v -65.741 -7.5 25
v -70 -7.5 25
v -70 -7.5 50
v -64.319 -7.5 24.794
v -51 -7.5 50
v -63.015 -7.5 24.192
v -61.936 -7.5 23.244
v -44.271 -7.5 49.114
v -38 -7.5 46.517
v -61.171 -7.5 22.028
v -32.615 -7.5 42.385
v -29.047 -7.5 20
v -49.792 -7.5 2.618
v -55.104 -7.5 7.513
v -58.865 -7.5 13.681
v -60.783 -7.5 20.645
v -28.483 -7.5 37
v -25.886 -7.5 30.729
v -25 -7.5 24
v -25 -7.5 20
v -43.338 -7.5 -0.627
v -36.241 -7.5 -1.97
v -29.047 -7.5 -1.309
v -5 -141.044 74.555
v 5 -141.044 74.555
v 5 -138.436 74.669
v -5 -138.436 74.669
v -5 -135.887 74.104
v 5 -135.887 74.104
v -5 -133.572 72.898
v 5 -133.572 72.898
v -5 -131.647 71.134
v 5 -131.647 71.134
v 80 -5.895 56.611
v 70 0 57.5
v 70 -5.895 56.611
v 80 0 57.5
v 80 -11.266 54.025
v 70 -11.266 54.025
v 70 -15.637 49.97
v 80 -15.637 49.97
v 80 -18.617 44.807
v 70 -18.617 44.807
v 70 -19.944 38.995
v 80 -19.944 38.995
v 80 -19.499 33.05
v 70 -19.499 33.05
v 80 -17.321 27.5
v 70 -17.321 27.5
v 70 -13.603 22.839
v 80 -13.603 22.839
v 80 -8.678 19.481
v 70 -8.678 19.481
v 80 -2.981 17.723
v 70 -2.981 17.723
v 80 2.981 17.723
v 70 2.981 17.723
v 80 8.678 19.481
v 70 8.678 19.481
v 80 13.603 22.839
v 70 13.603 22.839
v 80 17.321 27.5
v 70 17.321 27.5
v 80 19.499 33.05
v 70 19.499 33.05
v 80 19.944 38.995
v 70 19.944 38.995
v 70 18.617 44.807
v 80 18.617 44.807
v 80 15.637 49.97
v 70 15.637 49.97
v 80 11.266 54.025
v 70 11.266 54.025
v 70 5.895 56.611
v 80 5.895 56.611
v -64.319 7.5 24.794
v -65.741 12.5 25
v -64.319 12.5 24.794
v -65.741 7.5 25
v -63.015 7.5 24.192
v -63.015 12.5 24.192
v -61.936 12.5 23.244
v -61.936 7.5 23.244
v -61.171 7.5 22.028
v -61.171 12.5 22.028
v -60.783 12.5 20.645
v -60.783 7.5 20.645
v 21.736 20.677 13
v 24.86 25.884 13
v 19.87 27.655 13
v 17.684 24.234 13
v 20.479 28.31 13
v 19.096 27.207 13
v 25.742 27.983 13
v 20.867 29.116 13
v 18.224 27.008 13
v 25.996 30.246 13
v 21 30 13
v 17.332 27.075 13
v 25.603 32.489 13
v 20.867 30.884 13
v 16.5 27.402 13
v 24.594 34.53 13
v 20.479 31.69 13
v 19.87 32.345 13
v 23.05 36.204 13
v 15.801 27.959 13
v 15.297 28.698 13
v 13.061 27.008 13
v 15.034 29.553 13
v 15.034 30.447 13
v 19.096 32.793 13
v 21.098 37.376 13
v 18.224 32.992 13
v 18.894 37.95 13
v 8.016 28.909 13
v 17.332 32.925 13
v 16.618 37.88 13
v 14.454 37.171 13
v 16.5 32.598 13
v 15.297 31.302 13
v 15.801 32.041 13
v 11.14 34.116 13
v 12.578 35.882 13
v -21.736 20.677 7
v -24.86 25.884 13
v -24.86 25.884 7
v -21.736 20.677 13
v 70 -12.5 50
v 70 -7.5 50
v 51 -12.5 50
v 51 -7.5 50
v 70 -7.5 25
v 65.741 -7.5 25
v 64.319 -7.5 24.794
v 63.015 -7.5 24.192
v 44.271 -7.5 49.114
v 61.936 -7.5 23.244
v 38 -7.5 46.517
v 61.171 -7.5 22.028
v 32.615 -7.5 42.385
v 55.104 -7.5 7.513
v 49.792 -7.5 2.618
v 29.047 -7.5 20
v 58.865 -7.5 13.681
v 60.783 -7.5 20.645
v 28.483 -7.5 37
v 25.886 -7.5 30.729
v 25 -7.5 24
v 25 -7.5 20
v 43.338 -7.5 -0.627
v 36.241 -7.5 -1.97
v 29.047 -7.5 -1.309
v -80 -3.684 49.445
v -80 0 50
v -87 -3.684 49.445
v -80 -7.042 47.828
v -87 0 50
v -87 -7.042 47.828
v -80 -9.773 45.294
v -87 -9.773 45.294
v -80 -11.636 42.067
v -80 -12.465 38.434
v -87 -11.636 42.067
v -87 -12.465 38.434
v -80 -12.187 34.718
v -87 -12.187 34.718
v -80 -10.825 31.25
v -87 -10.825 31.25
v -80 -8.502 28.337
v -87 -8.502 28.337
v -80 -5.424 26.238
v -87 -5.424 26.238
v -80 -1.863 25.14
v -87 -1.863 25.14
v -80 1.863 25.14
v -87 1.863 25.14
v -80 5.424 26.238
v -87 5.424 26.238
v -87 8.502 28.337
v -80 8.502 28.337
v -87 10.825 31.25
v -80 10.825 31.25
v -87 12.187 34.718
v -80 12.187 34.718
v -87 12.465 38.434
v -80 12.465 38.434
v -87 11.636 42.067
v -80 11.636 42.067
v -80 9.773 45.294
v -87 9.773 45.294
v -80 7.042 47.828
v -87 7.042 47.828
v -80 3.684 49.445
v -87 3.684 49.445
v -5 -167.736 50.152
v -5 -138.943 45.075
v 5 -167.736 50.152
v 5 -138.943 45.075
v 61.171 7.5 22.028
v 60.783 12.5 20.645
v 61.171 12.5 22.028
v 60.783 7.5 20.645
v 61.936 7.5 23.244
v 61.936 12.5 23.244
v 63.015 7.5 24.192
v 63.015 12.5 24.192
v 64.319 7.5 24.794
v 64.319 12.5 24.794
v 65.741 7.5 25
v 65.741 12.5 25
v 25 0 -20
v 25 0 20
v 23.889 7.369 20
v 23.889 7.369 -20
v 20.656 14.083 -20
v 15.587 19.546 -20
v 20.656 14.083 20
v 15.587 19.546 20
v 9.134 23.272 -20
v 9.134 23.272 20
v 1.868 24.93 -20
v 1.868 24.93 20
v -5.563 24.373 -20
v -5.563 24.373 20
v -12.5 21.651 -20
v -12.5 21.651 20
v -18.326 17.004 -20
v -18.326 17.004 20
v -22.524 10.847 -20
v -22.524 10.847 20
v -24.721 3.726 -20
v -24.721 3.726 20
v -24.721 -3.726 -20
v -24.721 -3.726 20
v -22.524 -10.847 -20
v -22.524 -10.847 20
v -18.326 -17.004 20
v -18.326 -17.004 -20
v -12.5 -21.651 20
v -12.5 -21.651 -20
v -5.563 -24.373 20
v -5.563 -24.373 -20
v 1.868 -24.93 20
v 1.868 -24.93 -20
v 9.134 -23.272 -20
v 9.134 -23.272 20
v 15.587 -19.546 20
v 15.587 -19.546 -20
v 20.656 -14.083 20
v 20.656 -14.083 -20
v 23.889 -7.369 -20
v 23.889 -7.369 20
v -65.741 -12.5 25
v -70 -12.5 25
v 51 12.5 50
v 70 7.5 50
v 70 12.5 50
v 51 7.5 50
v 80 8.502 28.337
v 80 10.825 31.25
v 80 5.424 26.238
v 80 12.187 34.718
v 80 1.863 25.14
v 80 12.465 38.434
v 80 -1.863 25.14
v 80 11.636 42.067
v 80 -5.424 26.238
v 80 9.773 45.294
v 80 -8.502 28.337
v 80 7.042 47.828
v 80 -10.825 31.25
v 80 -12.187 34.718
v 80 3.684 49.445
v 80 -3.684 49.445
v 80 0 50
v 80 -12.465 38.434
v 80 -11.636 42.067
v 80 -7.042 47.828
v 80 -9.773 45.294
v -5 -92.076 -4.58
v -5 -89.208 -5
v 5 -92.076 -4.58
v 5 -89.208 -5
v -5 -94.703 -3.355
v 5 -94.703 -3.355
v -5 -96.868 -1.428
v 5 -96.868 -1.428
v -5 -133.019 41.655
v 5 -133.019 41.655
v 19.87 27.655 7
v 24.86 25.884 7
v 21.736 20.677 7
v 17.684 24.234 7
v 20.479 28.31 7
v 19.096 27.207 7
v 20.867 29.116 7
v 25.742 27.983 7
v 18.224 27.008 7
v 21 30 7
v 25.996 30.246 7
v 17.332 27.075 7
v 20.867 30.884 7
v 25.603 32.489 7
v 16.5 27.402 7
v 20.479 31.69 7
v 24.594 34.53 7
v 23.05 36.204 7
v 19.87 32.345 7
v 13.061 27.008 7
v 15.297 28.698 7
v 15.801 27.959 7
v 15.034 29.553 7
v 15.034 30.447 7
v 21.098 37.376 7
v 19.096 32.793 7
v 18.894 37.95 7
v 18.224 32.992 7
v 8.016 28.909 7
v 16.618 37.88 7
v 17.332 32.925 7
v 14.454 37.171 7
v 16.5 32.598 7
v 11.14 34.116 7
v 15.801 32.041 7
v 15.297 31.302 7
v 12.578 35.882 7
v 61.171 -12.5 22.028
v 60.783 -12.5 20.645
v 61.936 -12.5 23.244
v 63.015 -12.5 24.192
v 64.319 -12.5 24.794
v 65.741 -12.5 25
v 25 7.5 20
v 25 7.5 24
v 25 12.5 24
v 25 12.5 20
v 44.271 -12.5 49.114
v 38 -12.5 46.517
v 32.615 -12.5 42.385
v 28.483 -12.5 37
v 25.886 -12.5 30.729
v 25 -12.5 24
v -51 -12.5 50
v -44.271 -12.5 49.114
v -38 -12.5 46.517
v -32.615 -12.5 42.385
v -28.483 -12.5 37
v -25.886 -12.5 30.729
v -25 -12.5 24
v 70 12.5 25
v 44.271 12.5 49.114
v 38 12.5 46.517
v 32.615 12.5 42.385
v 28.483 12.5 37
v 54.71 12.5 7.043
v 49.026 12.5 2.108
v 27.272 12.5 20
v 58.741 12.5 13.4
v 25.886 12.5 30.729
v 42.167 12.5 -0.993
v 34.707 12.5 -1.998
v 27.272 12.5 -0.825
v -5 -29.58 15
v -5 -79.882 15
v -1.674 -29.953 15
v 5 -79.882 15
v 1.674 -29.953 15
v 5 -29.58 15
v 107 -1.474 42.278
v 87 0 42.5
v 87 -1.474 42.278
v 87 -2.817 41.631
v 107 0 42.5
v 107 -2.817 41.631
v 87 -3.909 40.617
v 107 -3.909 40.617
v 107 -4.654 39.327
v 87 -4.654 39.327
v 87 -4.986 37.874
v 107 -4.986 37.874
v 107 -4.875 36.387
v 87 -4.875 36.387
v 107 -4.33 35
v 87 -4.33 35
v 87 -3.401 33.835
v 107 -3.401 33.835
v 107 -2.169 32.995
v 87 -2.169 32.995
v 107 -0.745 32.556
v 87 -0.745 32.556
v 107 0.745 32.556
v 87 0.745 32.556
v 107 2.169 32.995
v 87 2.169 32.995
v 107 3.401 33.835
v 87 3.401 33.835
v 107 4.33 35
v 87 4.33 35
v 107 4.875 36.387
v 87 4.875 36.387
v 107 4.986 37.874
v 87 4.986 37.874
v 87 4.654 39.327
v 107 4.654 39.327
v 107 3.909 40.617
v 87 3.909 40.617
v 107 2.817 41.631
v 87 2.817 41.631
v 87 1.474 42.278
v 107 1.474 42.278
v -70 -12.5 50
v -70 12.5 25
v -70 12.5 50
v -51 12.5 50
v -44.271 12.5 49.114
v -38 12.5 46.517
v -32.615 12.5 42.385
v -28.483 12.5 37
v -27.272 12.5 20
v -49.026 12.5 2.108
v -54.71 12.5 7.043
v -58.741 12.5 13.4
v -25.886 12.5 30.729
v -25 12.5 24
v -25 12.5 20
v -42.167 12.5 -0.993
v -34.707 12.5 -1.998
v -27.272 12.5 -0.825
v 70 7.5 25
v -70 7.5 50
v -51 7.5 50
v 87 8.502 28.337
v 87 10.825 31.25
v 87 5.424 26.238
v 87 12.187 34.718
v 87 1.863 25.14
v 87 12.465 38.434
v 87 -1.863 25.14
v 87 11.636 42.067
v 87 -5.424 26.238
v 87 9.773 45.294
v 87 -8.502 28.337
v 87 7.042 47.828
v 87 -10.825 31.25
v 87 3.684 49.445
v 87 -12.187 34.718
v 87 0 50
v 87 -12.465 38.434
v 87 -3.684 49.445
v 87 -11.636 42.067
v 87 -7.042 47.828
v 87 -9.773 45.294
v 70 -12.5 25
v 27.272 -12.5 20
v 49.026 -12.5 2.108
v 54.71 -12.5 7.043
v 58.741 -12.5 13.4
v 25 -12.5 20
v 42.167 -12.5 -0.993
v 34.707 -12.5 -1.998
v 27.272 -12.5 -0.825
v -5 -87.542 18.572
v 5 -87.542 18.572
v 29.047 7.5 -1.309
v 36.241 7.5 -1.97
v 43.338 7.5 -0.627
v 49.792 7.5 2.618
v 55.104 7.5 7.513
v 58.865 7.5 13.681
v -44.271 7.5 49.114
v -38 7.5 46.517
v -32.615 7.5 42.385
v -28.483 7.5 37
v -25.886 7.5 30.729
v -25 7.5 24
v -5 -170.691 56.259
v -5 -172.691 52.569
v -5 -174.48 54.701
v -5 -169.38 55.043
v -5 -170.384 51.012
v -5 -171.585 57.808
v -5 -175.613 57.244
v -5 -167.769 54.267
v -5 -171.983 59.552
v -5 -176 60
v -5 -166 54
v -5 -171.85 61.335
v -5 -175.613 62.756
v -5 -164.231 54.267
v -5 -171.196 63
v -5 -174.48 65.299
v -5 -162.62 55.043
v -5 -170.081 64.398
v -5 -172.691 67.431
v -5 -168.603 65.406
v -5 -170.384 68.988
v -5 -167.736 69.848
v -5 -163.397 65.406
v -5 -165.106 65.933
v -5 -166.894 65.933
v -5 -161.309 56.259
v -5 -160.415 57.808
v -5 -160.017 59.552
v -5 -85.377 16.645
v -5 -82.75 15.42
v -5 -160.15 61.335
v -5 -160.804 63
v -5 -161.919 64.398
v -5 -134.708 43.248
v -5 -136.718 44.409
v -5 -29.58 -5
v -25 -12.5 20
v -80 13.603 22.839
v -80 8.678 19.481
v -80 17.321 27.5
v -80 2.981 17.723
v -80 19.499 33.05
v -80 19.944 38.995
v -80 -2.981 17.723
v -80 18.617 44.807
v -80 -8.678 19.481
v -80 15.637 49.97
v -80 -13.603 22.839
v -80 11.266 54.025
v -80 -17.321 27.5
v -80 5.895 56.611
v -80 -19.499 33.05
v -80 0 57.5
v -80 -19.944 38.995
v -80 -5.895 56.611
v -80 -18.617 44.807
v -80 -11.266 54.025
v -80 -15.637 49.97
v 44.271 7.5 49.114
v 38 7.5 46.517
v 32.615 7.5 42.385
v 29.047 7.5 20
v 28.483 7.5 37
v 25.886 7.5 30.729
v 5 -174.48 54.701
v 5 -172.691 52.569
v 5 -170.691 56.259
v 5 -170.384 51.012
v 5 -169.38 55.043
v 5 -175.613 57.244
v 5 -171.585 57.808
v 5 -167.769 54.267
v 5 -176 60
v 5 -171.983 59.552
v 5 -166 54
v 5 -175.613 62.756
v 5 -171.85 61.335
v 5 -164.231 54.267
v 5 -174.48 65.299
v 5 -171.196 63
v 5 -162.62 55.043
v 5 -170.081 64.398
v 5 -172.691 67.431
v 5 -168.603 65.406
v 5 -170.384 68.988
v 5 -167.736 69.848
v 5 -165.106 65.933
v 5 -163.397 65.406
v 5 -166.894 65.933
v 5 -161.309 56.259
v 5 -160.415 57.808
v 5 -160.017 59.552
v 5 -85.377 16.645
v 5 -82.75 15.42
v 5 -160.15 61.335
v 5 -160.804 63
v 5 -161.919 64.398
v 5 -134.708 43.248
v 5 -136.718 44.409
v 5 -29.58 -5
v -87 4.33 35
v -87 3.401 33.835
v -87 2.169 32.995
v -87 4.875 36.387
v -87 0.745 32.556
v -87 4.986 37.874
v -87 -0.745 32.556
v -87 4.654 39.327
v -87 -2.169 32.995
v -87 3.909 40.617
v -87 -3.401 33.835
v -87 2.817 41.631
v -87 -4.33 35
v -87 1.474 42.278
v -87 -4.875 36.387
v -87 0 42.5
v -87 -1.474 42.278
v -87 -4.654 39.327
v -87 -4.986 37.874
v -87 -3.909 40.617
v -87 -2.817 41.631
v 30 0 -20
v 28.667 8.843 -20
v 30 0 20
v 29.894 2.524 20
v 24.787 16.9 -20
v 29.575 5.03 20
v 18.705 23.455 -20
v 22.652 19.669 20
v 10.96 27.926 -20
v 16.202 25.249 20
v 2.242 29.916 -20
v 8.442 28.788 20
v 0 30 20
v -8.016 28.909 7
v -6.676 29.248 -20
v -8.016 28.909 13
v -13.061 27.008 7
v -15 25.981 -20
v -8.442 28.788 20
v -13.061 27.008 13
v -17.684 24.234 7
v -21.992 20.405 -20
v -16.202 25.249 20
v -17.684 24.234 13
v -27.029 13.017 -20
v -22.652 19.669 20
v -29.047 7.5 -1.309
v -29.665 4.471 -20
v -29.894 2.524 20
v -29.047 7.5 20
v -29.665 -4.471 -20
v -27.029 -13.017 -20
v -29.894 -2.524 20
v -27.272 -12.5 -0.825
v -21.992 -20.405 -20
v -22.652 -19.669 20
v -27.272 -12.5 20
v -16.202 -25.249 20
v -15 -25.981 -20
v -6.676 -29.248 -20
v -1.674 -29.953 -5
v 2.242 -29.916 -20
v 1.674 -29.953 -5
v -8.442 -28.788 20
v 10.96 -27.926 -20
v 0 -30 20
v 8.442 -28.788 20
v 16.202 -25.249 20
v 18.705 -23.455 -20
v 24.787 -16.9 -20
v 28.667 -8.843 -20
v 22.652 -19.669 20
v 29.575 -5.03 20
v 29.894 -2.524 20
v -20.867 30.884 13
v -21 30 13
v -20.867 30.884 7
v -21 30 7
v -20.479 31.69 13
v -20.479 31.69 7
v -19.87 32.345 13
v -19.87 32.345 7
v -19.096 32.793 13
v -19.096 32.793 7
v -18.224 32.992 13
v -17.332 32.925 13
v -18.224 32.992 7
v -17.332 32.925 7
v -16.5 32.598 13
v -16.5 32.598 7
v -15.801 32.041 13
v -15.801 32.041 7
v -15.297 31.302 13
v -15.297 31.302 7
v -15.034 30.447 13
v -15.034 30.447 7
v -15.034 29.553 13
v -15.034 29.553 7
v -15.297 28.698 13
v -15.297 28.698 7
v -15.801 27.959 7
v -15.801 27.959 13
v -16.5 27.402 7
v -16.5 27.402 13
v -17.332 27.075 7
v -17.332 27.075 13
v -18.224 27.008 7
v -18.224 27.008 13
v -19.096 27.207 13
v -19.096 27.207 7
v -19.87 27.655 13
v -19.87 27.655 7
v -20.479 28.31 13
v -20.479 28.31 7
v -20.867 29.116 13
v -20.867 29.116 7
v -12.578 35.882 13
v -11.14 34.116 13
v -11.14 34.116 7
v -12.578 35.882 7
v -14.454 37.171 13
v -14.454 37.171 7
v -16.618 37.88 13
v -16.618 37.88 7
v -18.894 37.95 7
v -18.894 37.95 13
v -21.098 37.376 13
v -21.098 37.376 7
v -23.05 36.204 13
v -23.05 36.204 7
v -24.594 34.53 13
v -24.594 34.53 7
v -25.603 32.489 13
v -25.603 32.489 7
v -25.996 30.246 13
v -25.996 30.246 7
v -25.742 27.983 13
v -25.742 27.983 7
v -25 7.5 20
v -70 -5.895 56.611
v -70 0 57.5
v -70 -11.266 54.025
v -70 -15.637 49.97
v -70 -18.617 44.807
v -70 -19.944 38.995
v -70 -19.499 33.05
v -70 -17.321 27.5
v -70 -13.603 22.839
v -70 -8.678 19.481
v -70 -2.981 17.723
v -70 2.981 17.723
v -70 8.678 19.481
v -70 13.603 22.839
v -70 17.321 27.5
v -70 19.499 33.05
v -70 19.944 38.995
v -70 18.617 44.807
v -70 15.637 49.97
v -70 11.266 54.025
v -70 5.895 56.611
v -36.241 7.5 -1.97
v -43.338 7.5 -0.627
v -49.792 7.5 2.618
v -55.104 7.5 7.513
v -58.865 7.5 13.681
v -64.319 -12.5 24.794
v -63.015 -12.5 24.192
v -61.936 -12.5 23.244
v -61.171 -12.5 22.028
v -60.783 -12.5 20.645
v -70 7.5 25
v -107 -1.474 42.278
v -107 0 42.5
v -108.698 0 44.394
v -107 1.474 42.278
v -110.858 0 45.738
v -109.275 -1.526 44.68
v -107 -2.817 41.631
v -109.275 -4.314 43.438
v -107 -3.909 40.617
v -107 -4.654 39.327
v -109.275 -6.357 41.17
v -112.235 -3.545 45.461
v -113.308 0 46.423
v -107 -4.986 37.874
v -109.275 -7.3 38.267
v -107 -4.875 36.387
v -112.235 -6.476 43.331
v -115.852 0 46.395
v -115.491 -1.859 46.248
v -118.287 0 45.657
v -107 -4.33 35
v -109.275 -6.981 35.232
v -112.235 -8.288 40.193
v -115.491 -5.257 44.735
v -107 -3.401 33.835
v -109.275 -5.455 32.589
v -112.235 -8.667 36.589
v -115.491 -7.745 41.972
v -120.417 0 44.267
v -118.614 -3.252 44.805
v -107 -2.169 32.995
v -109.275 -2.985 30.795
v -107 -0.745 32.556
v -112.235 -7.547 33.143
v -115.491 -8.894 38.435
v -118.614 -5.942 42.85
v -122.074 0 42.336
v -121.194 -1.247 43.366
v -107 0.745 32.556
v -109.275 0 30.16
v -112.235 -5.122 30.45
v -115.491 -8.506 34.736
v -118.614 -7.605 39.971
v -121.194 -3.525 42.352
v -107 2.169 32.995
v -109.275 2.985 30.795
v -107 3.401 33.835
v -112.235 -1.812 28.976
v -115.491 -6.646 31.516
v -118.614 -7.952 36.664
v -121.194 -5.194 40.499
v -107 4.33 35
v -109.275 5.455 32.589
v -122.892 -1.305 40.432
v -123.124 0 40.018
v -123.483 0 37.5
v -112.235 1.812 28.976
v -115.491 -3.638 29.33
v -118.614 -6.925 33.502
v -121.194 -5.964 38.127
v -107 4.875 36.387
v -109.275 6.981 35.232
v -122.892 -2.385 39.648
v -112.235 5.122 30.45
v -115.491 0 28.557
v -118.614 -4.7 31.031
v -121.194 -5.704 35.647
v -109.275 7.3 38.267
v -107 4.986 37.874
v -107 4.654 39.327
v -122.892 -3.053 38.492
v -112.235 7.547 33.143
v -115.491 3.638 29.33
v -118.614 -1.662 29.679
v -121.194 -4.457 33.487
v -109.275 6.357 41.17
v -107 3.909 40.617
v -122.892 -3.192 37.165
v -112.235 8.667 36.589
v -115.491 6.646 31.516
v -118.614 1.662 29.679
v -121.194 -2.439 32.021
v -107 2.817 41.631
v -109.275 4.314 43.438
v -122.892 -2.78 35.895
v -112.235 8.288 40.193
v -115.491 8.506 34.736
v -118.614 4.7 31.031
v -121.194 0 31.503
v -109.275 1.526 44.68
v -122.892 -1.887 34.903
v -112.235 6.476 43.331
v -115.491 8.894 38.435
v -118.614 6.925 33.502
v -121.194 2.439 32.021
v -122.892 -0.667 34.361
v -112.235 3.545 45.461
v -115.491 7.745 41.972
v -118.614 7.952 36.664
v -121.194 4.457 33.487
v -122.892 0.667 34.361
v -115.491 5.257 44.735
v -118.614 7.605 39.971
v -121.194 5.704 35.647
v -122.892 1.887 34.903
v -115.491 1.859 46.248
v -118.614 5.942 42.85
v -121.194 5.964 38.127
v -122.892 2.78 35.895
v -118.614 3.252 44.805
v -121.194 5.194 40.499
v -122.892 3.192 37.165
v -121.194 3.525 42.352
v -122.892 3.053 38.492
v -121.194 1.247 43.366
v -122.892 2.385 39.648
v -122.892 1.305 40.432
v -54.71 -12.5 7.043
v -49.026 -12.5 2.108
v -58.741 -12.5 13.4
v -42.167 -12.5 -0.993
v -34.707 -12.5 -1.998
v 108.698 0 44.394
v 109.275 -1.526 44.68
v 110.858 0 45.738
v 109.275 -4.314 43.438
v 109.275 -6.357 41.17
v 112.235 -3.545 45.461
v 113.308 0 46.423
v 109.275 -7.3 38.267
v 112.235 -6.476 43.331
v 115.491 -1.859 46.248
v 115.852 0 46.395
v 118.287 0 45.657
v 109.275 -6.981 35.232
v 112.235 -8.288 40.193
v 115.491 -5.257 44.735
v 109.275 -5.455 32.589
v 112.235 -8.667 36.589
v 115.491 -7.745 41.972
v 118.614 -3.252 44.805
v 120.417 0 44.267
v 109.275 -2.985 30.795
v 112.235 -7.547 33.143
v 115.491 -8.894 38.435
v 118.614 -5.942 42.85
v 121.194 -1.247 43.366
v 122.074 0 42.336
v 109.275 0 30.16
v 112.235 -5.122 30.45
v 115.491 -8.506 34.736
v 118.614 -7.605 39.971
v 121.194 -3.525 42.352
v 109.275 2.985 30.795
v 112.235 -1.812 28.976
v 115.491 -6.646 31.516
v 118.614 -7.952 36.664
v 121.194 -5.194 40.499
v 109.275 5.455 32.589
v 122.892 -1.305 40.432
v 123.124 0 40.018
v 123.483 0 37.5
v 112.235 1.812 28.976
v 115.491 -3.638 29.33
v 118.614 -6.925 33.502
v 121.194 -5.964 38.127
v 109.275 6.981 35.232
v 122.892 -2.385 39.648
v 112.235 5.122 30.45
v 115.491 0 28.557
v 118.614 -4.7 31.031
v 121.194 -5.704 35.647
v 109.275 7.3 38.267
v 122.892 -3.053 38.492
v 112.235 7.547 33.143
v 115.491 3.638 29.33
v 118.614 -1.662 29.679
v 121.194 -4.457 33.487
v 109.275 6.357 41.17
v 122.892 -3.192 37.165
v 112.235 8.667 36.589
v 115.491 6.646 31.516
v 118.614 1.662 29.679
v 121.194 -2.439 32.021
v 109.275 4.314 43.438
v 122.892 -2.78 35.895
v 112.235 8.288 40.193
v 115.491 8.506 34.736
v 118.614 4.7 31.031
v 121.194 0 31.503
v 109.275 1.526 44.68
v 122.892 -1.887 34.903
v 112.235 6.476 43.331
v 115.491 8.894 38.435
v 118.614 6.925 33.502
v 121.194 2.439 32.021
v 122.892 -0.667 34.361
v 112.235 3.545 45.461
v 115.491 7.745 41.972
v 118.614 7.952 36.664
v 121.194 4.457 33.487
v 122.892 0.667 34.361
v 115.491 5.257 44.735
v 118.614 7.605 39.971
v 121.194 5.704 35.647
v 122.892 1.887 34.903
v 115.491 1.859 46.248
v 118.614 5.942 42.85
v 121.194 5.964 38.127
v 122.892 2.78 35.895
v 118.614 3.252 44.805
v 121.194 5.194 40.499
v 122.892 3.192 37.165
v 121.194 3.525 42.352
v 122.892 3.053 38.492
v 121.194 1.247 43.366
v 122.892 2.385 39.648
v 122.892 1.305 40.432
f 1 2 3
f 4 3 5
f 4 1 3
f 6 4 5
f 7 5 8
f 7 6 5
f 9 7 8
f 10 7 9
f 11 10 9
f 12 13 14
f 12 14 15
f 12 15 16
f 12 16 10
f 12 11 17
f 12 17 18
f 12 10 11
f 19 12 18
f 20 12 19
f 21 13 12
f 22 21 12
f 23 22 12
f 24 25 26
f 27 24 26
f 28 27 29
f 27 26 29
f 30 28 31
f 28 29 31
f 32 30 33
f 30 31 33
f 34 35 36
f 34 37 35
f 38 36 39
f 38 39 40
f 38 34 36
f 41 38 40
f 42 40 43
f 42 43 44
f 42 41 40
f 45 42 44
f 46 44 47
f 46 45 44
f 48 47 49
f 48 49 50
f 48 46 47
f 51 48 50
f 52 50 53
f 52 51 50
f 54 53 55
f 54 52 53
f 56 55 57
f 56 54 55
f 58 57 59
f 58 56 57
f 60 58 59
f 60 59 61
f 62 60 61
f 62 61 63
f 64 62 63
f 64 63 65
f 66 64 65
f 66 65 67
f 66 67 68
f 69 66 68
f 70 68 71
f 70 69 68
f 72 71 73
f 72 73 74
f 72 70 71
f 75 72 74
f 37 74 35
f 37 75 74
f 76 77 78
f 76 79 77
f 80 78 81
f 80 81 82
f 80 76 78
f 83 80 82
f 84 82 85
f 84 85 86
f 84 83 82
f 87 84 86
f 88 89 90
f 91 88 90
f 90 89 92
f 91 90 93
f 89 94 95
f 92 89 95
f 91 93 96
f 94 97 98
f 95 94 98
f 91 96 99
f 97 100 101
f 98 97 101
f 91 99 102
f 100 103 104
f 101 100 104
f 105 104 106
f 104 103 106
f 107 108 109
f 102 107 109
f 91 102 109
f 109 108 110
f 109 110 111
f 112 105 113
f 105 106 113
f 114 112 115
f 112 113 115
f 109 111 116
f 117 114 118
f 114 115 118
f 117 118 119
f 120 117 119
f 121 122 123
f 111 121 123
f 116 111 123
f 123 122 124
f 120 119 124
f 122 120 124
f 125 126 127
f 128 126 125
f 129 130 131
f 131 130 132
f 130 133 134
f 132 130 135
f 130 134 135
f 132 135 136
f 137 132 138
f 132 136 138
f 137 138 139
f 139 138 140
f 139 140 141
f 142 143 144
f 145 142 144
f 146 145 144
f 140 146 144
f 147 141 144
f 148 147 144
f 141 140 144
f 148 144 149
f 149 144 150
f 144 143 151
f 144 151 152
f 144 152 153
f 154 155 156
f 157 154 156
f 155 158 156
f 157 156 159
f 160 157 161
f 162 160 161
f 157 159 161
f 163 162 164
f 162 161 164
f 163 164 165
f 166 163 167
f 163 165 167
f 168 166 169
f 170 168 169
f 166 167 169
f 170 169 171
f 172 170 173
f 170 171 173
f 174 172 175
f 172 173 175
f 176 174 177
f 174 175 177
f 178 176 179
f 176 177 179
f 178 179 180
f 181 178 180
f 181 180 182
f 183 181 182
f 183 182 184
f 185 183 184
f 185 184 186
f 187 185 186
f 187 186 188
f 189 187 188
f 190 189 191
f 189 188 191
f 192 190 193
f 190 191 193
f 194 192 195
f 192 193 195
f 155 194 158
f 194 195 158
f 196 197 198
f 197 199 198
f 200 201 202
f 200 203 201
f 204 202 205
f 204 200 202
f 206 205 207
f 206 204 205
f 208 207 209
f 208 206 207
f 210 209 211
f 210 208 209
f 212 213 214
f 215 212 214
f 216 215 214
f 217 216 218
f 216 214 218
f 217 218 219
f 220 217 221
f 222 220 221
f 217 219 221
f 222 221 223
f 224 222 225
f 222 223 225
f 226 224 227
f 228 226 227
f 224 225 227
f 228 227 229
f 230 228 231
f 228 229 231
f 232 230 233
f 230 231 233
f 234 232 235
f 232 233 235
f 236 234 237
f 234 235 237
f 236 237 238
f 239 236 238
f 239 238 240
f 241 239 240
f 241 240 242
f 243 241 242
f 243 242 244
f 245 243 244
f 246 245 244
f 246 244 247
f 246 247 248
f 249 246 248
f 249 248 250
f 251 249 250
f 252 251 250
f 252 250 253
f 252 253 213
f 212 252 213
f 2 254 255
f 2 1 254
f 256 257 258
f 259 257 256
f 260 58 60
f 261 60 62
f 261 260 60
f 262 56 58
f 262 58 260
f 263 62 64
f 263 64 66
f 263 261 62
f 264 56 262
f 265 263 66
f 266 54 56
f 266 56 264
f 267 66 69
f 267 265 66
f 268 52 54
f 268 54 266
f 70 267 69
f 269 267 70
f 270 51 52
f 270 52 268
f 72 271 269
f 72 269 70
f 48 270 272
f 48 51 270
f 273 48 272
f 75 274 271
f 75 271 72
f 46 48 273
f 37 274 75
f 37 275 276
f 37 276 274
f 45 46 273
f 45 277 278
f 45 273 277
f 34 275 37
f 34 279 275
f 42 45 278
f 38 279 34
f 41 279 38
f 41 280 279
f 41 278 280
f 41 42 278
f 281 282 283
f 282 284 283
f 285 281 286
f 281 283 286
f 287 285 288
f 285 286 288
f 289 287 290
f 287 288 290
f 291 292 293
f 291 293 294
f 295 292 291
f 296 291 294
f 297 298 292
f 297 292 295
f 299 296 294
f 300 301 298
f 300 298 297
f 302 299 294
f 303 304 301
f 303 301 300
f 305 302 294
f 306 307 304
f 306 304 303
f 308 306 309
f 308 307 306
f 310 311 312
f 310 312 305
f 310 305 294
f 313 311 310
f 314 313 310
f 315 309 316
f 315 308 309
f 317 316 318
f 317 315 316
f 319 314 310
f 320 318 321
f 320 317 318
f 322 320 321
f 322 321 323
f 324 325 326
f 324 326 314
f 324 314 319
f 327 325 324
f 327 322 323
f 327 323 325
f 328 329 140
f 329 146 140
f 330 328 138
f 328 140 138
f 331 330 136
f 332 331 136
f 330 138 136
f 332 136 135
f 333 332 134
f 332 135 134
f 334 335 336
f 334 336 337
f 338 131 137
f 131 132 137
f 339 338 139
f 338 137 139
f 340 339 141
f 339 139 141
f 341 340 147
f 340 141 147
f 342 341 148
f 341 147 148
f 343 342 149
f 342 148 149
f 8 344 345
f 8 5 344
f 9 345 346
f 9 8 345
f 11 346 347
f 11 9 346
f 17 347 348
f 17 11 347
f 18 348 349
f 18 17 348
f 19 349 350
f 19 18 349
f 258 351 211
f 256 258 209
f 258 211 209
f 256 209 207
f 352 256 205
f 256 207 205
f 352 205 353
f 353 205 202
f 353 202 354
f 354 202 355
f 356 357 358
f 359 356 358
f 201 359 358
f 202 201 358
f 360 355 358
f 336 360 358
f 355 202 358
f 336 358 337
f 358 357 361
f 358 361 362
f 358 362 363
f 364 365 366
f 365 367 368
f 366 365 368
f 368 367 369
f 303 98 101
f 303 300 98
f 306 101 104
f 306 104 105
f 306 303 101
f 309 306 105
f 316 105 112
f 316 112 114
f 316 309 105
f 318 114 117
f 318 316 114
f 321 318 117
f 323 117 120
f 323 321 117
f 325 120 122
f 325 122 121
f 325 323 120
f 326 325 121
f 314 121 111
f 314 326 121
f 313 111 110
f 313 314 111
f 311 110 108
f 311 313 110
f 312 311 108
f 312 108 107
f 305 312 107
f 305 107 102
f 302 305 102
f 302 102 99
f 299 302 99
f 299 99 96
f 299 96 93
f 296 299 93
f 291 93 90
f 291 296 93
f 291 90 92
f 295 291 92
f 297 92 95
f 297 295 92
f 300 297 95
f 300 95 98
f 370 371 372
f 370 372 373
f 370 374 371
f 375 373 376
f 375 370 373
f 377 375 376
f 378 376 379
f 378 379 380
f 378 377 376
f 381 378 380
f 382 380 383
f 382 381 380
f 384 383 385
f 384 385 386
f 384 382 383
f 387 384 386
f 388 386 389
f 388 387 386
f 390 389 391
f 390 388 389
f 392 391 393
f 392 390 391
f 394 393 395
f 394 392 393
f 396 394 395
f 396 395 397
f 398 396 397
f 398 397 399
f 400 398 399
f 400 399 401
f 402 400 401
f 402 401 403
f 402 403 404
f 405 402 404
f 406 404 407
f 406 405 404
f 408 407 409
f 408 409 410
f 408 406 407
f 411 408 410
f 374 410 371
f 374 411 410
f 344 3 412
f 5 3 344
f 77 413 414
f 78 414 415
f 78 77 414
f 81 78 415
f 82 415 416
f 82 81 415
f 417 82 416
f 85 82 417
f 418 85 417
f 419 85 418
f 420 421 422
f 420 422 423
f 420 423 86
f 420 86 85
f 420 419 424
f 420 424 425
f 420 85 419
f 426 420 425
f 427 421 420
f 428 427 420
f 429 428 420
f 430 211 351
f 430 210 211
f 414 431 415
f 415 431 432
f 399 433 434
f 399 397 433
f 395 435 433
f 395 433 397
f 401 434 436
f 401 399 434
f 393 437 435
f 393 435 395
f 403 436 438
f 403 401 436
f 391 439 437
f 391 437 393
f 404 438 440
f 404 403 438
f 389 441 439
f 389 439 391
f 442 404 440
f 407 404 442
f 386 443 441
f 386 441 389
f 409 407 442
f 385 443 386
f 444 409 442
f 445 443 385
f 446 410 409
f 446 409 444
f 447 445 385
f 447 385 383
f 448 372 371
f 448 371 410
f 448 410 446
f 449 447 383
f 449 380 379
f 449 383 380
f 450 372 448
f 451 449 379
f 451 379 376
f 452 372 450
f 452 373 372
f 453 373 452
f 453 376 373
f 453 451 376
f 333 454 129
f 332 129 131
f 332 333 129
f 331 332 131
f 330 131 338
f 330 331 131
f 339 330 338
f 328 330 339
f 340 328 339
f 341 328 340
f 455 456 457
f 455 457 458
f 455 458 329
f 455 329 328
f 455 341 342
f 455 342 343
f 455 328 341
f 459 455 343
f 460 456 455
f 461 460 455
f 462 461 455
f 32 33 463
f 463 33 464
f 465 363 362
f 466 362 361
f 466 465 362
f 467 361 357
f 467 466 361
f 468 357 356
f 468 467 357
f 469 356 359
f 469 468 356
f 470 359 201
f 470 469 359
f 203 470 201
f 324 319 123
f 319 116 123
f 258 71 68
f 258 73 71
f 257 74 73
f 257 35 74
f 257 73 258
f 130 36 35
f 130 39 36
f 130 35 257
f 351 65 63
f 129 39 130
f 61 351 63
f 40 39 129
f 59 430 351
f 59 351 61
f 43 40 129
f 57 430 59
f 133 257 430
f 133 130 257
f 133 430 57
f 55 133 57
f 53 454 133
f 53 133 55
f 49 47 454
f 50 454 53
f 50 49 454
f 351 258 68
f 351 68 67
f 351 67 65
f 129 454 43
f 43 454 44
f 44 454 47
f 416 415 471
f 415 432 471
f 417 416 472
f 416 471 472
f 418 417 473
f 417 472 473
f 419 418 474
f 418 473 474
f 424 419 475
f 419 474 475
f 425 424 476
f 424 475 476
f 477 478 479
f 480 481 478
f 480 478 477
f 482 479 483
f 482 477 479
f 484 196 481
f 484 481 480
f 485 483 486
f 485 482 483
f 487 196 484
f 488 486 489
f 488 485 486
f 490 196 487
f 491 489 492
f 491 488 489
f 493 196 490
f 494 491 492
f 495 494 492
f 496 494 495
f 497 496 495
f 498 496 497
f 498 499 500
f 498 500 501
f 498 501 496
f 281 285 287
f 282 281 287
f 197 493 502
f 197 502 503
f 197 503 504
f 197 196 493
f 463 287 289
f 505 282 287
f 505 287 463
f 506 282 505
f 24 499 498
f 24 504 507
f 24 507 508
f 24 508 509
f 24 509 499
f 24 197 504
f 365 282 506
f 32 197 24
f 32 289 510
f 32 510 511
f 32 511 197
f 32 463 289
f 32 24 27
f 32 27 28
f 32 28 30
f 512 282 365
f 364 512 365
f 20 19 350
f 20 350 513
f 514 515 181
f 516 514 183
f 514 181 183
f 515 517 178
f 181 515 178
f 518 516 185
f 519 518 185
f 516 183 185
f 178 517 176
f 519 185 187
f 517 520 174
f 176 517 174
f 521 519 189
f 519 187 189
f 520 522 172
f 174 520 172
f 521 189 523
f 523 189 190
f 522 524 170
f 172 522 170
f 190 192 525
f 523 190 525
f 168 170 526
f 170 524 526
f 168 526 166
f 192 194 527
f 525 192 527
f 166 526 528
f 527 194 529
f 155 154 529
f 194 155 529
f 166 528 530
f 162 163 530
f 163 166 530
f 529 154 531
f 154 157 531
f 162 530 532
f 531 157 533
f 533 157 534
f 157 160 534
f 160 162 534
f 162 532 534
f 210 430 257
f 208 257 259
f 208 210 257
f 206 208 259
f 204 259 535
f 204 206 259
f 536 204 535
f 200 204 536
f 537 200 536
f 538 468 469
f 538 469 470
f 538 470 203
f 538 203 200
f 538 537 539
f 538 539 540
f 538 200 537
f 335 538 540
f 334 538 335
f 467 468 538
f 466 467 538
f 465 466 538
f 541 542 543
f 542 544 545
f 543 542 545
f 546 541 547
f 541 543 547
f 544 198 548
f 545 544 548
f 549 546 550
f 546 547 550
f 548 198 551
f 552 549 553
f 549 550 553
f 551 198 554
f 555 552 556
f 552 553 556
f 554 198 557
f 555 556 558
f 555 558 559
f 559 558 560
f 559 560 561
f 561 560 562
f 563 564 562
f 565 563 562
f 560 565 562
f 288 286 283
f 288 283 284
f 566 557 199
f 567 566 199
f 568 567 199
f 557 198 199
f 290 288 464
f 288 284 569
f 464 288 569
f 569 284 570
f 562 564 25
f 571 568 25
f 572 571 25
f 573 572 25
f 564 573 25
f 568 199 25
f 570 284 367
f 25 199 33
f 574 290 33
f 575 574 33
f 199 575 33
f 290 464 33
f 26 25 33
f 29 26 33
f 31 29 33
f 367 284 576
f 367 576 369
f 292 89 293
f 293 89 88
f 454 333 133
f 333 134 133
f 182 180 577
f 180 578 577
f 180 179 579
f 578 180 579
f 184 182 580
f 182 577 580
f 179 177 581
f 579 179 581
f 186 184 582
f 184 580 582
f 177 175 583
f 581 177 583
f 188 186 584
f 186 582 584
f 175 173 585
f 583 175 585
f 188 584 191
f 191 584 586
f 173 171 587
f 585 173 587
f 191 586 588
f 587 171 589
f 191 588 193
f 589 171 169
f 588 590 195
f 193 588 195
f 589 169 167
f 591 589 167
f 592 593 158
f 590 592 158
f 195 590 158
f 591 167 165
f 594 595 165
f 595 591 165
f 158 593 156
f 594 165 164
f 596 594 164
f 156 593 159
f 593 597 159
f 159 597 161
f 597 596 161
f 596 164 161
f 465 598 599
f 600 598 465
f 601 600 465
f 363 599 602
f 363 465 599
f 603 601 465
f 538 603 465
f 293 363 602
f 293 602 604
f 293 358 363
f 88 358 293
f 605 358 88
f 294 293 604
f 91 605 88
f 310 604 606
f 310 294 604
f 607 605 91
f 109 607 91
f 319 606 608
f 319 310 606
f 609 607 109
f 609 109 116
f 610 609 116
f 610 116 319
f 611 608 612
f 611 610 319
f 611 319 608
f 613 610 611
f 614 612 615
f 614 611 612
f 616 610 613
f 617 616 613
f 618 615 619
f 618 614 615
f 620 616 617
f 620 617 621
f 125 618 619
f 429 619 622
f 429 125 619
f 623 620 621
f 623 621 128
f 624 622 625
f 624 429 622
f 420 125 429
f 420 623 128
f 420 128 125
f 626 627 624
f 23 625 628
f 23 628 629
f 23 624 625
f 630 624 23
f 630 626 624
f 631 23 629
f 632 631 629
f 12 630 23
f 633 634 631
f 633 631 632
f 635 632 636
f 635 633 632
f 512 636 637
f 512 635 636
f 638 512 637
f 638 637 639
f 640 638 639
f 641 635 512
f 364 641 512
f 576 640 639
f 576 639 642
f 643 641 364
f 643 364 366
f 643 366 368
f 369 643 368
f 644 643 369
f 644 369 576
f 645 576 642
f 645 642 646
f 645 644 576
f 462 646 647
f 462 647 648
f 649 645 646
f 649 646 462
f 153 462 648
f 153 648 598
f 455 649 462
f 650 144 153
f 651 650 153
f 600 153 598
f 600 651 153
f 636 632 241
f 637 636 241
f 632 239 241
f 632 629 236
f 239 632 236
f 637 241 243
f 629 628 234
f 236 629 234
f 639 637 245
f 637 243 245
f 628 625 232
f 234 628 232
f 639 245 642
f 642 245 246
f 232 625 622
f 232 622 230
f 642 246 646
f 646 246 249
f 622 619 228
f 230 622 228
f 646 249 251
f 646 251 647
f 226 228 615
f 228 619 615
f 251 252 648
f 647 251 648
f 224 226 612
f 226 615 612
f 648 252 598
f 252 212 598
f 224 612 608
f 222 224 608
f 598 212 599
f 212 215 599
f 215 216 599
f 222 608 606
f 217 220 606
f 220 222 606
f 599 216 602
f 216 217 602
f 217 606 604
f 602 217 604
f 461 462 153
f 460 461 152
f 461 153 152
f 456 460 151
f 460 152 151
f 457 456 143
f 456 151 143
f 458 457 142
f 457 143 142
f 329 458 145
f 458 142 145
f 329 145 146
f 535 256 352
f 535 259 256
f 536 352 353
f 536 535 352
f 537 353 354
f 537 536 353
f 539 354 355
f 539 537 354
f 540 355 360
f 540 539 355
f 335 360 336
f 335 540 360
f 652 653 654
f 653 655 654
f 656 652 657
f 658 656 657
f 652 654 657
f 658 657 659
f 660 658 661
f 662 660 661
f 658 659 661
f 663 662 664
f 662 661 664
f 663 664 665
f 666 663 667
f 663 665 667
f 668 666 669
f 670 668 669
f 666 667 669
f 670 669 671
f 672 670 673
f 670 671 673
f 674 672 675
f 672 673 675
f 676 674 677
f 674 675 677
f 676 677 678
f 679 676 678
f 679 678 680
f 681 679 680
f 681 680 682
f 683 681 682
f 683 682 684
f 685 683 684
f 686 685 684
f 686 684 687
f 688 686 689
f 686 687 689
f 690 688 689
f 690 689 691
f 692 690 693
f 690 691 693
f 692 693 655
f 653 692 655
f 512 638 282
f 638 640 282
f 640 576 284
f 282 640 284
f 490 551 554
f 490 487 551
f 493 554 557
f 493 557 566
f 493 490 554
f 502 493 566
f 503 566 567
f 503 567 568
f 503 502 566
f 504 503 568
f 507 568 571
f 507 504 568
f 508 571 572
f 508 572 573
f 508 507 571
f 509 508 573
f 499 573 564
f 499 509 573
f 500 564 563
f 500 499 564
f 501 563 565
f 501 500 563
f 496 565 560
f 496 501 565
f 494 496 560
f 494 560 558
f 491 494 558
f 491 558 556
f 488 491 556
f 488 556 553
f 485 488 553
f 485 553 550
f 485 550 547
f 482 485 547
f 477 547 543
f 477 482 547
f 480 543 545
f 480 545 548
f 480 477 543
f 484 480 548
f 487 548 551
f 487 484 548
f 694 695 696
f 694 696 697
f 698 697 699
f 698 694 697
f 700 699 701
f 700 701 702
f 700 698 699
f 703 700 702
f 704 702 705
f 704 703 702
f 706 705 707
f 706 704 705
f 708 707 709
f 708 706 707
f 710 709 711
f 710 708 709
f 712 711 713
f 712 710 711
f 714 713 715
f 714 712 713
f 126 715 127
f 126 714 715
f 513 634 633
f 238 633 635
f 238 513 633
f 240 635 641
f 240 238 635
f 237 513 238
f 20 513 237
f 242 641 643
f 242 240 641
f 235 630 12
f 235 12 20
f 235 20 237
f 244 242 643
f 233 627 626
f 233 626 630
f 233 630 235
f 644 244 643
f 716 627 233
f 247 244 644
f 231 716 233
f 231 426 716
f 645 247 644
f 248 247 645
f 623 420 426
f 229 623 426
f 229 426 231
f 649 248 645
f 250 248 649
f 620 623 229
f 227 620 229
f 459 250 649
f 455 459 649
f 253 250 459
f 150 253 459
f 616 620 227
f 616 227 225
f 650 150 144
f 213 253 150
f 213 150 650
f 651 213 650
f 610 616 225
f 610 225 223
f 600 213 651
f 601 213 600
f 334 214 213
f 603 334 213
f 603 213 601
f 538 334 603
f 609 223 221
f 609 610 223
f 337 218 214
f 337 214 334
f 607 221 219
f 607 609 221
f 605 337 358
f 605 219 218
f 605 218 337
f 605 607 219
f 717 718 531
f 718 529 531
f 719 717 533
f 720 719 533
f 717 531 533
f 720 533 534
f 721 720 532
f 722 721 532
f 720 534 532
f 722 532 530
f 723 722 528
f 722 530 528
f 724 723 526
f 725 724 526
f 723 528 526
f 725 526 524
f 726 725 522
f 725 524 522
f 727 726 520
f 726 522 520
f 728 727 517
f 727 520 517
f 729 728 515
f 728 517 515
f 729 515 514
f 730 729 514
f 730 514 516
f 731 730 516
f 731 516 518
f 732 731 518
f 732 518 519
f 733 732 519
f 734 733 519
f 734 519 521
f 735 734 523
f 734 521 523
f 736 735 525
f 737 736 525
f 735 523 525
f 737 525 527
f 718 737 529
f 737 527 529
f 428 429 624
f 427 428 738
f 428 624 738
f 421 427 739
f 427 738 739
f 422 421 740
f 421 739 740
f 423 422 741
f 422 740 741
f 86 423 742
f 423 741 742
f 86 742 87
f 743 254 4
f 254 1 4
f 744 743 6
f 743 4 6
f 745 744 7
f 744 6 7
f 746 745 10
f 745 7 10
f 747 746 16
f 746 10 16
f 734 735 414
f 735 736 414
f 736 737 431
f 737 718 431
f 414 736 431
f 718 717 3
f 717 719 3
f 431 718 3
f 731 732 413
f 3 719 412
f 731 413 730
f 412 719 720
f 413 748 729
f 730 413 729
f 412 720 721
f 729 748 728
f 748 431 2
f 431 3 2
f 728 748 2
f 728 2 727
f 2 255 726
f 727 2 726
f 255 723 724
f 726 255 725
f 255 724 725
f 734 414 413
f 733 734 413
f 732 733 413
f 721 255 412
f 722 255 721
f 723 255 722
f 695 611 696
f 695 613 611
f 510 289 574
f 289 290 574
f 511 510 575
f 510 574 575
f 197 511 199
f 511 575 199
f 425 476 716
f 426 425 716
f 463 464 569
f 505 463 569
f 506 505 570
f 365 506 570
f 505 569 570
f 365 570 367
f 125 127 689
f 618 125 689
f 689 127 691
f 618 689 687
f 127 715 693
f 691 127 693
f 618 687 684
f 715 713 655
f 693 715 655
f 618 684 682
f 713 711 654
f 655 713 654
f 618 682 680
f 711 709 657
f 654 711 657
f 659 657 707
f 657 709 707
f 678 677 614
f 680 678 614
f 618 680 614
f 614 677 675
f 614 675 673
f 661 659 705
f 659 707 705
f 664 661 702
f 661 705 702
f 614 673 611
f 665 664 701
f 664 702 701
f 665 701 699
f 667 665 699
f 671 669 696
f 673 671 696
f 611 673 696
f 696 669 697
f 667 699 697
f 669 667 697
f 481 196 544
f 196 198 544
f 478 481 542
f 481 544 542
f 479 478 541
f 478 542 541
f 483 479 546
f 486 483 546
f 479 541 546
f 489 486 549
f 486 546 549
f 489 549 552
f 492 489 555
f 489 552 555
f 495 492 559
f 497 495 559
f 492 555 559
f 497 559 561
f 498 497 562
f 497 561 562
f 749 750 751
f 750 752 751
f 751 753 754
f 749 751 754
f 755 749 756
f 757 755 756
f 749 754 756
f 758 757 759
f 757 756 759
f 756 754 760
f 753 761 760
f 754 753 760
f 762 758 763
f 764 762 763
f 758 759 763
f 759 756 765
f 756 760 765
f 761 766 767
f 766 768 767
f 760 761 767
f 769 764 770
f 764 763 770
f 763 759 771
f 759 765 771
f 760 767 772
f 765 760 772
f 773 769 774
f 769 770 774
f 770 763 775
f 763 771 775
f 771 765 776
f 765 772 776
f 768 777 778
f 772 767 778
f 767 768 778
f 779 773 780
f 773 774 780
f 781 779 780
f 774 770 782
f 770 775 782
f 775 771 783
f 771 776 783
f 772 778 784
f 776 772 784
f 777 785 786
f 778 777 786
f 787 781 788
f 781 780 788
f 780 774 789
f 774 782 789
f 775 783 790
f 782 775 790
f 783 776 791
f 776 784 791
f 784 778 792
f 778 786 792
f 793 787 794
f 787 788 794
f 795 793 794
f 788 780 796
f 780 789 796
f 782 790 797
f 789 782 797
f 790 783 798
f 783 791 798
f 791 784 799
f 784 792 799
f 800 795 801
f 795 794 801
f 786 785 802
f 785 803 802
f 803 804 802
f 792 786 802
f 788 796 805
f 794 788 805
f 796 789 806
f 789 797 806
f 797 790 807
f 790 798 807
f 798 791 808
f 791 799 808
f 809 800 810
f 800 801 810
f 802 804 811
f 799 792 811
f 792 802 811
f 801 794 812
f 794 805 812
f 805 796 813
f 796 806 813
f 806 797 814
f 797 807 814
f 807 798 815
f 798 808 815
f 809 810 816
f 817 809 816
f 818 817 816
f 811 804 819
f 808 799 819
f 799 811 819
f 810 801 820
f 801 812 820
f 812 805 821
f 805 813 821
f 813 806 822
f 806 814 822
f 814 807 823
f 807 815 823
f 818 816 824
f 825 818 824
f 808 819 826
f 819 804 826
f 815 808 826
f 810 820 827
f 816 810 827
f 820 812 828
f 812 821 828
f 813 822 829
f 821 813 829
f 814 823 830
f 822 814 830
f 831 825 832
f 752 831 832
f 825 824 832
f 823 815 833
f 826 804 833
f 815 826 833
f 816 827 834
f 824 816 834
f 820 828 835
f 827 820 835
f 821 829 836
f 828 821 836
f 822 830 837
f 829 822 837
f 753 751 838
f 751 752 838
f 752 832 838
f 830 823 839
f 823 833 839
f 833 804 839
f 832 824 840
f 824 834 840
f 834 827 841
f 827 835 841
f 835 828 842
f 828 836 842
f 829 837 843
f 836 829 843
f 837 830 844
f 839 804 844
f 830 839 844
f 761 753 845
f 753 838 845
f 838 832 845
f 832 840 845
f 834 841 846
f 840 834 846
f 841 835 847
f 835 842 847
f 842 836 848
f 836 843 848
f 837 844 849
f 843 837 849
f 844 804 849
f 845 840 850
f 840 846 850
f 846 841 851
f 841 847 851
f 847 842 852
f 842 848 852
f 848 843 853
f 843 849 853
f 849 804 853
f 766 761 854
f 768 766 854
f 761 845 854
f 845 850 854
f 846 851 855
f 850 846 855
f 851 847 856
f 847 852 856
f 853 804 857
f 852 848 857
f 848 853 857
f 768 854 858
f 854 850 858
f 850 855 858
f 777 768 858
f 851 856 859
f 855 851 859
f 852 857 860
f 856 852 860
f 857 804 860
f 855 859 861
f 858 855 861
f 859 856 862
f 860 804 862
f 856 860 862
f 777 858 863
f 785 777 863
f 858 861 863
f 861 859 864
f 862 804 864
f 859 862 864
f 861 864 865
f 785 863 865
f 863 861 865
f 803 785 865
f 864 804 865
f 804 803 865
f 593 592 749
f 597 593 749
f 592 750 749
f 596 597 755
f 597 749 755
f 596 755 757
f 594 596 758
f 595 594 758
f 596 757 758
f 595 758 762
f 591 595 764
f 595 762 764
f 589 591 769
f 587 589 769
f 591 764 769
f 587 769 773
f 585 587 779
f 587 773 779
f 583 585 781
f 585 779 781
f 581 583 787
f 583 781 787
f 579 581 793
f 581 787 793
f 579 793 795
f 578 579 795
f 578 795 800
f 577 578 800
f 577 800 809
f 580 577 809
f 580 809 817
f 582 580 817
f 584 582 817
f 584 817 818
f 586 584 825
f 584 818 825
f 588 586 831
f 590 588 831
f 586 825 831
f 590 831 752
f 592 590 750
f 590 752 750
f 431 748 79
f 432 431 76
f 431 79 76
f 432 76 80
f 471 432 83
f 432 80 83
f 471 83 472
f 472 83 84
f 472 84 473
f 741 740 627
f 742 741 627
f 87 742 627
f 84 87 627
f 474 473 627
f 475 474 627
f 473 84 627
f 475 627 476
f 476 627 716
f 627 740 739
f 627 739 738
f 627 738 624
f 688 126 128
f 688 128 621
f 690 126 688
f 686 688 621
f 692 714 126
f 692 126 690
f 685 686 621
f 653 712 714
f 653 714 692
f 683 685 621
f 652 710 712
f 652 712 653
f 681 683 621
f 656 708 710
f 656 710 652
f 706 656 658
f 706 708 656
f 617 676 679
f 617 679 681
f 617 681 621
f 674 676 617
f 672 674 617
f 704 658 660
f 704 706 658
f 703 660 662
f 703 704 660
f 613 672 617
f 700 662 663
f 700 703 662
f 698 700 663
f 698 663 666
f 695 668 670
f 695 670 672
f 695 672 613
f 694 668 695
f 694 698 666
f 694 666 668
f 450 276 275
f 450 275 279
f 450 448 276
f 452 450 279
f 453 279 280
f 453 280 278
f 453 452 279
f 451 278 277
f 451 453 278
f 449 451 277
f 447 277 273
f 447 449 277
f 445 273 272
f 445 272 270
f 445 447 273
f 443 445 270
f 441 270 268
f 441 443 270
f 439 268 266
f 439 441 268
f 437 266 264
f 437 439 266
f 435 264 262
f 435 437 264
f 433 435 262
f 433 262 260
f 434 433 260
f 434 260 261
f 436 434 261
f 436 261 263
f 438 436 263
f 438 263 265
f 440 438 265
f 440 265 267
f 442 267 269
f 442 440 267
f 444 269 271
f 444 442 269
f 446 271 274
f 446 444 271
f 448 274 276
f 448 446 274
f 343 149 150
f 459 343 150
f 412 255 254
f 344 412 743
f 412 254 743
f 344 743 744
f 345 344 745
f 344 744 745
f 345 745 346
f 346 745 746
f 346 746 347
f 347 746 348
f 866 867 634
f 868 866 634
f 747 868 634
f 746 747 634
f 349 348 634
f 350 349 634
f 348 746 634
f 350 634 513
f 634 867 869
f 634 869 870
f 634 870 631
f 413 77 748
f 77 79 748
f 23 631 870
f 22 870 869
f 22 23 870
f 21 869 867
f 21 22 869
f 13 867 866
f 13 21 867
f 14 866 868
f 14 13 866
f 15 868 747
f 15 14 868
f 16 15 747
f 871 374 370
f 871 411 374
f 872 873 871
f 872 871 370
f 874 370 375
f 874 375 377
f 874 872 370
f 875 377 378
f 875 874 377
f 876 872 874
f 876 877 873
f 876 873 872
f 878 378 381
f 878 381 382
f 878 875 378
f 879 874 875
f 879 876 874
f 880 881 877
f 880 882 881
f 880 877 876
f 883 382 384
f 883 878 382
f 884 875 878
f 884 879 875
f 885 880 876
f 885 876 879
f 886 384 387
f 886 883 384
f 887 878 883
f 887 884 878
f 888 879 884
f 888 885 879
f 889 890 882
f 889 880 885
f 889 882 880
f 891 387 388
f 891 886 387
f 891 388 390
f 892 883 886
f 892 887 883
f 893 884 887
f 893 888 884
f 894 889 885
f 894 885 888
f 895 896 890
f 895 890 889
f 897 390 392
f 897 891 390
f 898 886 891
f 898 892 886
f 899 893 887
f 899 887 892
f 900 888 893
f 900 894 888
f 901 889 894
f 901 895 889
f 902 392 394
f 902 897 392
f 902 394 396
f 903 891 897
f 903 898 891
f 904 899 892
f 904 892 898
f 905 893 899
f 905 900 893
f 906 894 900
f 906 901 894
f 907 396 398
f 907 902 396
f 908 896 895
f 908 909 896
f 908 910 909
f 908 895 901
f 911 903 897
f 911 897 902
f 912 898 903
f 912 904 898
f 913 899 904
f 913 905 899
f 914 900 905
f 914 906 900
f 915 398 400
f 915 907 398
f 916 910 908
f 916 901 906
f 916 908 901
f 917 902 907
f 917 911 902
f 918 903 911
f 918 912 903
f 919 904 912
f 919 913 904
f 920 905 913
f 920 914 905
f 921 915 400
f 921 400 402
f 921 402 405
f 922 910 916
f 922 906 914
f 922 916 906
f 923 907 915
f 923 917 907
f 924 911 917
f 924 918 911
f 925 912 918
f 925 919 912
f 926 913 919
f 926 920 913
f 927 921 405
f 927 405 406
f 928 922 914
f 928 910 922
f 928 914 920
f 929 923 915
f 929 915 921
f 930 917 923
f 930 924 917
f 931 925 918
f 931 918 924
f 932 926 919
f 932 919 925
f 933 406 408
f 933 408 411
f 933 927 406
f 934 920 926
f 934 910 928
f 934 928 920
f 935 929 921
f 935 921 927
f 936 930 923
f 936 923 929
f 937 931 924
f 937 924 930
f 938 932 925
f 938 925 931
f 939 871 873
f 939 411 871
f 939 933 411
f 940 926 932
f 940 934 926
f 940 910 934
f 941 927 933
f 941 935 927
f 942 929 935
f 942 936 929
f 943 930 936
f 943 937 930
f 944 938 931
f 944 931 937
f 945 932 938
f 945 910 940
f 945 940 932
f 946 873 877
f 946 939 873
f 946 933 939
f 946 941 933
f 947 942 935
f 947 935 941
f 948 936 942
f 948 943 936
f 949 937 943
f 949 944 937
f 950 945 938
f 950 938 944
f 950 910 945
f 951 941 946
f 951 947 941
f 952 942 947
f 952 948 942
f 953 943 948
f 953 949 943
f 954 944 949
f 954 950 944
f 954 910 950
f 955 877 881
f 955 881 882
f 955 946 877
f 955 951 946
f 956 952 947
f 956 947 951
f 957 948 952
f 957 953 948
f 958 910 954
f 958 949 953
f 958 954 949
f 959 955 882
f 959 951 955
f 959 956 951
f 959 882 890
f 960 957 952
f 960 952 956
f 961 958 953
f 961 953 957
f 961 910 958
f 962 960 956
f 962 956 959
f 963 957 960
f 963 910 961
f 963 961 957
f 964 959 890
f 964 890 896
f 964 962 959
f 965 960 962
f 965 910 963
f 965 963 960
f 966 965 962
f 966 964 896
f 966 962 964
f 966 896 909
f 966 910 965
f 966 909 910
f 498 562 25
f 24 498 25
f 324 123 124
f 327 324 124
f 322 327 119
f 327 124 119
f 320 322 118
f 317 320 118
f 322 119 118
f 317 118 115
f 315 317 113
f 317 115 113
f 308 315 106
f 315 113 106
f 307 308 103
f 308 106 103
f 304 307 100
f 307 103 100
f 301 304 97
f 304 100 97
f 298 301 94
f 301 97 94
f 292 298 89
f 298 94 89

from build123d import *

# Parameters (mm, degrees)
SKETCH1_R               = 30
BOSS_EXTRUDE1_DEPTH     = 20
SKETCH2_R               = 6
BOSS_EXTRUDE2_DEPTH     = 5
BOSS_EXTRUDE3_DEPTH     = 2.5
SKETCH8_R               = 3
BOSS_EXTRUDE4_DEPTH     = 3
MIRROR2_COPY_1_DEPTH    = 2.5
SKETCH3_R               = 25
CUT_EXTRUDE1_DEPTH      = 55.706602517
CUT_EXTRUDE1_DEPTH_BACK = 41.0000001
FILLET1_R               = 5


with BuildPart() as part:
    # Sketch1 → Boss-Extrude1 (new body, symmetric)
    with BuildSketch(Plane.XY):
        Circle(SKETCH1_R)
    extrude(amount=BOSS_EXTRUDE1_DEPTH, both=True)

    # Sketch2 → Boss-Extrude2 (add, symmetric)
    with BuildSketch(Plane(origin=(0, 0, 0), x_dir=(0, 0, -1), z_dir=(1, 0, 0))):
        with BuildLine():
            Line((-15, 0), (5, 0))
            Line((5, 0), (5, -89.20774256))
            ThreePointArc((5, -89.20774256), (4.06307787, -93.433925178), (1.427876097, -96.868186992))
            Line((1.427876097, -96.868186992), (-41.654587977, -133.018666706))
            ThreePointArc((-41.654587977, -133.018666706), (-43.886965918, -135.679111138), (-45.07478941, -138.942629361))
            Line((-45.07478941, -138.942629361), (-50.15192247, -167.736481777))
            ThreePointArc((-50.15192247, -167.736481777), (-60, -176), (-69.84807753, -167.736481777))
            Line((-69.84807753, -167.736481777), (-74.554680047, -141.044012488))
            ThreePointArc((-74.554680047, -141.044012488), (-74.103528725, -135.887329278), (-71.134478614, -131.64708628))
            Line((-71.134478614, -131.64708628), (-18.572123903, -87.542033829))
            ThreePointArc((-18.572123903, -87.542033829), (-15.93692213, -84.107772015), (-15, -79.881589397))
            Line((-15, -79.881589397), (-15, 0))
        make_face()
        with Locations((-60, -166)):
            Circle(SKETCH2_R, mode=Mode.SUBTRACT)
    extrude(amount=BOSS_EXTRUDE2_DEPTH, both=True)

    # Sketch5 → Boss-Extrude3 (add, symmetric)
    with BuildSketch(Plane(origin=(0, -10, 10), x_dir=(1, 0, 0), z_dir=(0, 1, 0))):
        with BuildLine():
            Line((60.980762114, -15), (70, -15))
            Line((70, -15), (70, -40))
            Line((70, -40), (51, -40))
            ThreePointArc((51, -40), (32.615223689, -32.384776311), (25, -14))
            Line((25, -14), (25, 10))
            ThreePointArc((25, 10), (49.835639165, 7.351904144), (60.980762114, -15))
        make_face()
    boss_extrude3 = extrude(amount=BOSS_EXTRUDE3_DEPTH, both=True)

    # Mirror1: Boss-Extrude3 across plane
    add(boss_extrude3.mirror(Plane.ZX))

    # Sketch7 → Revolve1 (revolve)
    with BuildSketch(Plane.XZ, mode=Mode.PRIVATE) as revolve1_sk:
        with BuildLine():
            Line((70, 17.5), (80, 17.5))
            Line((80, 17.5), (80, 25))
            Line((80, 25), (87, 25))
            Line((87, 25), (87, 32.5))
            Line((87, 32.5), (107, 32.5))
            ThreePointArc((107, 32.5), (117.095800854, 28.88751392), (123.483314774, 37.5))
            Line((123.483314774, 37.5), (70, 37.5))
            Line((70, 37.5), (70, 17.5))
        make_face()
    revolve1 = revolve(revolve1_sk.sketch.rotate(Axis((70, 0, 37.5), (1, 0, 0)), 180), axis=Axis((70, 0, 37.5), (1, 0, 0)))  # turned: the seam where the file's is

    # Sketch8 → Boss-Extrude4 (add, symmetric)
    with BuildSketch(Plane.XY.offset(10)):
        with BuildLine():
            Line((24.859943406, 25.884033957), (21.735901111, 20.677296799))
            ThreePointArc((21.735901111, 20.677296799), (15.434872663, 25.724787771), (8.0160143, 28.909228885))
            Line((8.0160143, 28.909228885), (11.140056594, 34.115966043))
            ThreePointArc((11.140056594, 34.115966043), (22.115966043, 36.859943406), (24.859943406, 25.884033957))
        make_face()
        with Locations((18, 30)):
            Circle(SKETCH8_R, mode=Mode.SUBTRACT)
    boss_extrude4 = extrude(amount=BOSS_EXTRUDE4_DEPTH, both=True)

    # Mirror2: Boss-Extrude4, Revolve1, Boss-Extrude3 across plane
    add(boss_extrude4.mirror(Plane(origin=(0, 0, 0), x_dir=(0, 0, 1), z_dir=(1, 0, 0))))
    add(revolve1.mirror(Plane(origin=(0, 0, 0), x_dir=(0, 0, 1), z_dir=(1, 0, 0))))
    add(boss_extrude3.mirror(Plane(origin=(0, 0, 0), x_dir=(0, 0, 1), z_dir=(1, 0, 0))))

    # Mirror2 copy 1 sketch → Mirror2 copy 1 (add, symmetric)
    with BuildSketch(Plane(origin=(0, 10, 10), x_dir=(-1, 0, 0), z_dir=(0, -1, 0))):
        with BuildLine():
            Line((60.980762114, -15), (70, -15))
            Line((70, -15), (70, -40))
            Line((70, -40), (51, -40))
            ThreePointArc((51, -40), (32.615223689, -32.384776311), (25, -14))
            Line((25, -14), (25, 10))
            ThreePointArc((25, 10), (49.835639165, 7.351904144), (60.980762114, -15))
        make_face()
    extrude(amount=MIRROR2_COPY_1_DEPTH, both=True)

    # Sketch3 → Cut-Extrude1 (cut, two sides)
    with BuildSketch(Plane.XY.offset(20)) as cut_extrude1_sk:
        Circle(SKETCH3_R)
    extrude(amount=CUT_EXTRUDE1_DEPTH, mode=Mode.SUBTRACT)
    extrude(cut_extrude1_sk.sketch, amount=-CUT_EXTRUDE1_DEPTH_BACK, mode=Mode.SUBTRACT)

    # Fillet1
    fillet1_edges = [part.edges().sort_by_distance(p)[0] for p in [
        (-60.980762114, -10, 25),
        (-60.980762114, 10, 25),
        (60.980762114, -10, 25),
        (60.980762114, 10, 25),
    ]]
    fillet(fillet1_edges, radius=FILLET1_R)


solid = part.part
